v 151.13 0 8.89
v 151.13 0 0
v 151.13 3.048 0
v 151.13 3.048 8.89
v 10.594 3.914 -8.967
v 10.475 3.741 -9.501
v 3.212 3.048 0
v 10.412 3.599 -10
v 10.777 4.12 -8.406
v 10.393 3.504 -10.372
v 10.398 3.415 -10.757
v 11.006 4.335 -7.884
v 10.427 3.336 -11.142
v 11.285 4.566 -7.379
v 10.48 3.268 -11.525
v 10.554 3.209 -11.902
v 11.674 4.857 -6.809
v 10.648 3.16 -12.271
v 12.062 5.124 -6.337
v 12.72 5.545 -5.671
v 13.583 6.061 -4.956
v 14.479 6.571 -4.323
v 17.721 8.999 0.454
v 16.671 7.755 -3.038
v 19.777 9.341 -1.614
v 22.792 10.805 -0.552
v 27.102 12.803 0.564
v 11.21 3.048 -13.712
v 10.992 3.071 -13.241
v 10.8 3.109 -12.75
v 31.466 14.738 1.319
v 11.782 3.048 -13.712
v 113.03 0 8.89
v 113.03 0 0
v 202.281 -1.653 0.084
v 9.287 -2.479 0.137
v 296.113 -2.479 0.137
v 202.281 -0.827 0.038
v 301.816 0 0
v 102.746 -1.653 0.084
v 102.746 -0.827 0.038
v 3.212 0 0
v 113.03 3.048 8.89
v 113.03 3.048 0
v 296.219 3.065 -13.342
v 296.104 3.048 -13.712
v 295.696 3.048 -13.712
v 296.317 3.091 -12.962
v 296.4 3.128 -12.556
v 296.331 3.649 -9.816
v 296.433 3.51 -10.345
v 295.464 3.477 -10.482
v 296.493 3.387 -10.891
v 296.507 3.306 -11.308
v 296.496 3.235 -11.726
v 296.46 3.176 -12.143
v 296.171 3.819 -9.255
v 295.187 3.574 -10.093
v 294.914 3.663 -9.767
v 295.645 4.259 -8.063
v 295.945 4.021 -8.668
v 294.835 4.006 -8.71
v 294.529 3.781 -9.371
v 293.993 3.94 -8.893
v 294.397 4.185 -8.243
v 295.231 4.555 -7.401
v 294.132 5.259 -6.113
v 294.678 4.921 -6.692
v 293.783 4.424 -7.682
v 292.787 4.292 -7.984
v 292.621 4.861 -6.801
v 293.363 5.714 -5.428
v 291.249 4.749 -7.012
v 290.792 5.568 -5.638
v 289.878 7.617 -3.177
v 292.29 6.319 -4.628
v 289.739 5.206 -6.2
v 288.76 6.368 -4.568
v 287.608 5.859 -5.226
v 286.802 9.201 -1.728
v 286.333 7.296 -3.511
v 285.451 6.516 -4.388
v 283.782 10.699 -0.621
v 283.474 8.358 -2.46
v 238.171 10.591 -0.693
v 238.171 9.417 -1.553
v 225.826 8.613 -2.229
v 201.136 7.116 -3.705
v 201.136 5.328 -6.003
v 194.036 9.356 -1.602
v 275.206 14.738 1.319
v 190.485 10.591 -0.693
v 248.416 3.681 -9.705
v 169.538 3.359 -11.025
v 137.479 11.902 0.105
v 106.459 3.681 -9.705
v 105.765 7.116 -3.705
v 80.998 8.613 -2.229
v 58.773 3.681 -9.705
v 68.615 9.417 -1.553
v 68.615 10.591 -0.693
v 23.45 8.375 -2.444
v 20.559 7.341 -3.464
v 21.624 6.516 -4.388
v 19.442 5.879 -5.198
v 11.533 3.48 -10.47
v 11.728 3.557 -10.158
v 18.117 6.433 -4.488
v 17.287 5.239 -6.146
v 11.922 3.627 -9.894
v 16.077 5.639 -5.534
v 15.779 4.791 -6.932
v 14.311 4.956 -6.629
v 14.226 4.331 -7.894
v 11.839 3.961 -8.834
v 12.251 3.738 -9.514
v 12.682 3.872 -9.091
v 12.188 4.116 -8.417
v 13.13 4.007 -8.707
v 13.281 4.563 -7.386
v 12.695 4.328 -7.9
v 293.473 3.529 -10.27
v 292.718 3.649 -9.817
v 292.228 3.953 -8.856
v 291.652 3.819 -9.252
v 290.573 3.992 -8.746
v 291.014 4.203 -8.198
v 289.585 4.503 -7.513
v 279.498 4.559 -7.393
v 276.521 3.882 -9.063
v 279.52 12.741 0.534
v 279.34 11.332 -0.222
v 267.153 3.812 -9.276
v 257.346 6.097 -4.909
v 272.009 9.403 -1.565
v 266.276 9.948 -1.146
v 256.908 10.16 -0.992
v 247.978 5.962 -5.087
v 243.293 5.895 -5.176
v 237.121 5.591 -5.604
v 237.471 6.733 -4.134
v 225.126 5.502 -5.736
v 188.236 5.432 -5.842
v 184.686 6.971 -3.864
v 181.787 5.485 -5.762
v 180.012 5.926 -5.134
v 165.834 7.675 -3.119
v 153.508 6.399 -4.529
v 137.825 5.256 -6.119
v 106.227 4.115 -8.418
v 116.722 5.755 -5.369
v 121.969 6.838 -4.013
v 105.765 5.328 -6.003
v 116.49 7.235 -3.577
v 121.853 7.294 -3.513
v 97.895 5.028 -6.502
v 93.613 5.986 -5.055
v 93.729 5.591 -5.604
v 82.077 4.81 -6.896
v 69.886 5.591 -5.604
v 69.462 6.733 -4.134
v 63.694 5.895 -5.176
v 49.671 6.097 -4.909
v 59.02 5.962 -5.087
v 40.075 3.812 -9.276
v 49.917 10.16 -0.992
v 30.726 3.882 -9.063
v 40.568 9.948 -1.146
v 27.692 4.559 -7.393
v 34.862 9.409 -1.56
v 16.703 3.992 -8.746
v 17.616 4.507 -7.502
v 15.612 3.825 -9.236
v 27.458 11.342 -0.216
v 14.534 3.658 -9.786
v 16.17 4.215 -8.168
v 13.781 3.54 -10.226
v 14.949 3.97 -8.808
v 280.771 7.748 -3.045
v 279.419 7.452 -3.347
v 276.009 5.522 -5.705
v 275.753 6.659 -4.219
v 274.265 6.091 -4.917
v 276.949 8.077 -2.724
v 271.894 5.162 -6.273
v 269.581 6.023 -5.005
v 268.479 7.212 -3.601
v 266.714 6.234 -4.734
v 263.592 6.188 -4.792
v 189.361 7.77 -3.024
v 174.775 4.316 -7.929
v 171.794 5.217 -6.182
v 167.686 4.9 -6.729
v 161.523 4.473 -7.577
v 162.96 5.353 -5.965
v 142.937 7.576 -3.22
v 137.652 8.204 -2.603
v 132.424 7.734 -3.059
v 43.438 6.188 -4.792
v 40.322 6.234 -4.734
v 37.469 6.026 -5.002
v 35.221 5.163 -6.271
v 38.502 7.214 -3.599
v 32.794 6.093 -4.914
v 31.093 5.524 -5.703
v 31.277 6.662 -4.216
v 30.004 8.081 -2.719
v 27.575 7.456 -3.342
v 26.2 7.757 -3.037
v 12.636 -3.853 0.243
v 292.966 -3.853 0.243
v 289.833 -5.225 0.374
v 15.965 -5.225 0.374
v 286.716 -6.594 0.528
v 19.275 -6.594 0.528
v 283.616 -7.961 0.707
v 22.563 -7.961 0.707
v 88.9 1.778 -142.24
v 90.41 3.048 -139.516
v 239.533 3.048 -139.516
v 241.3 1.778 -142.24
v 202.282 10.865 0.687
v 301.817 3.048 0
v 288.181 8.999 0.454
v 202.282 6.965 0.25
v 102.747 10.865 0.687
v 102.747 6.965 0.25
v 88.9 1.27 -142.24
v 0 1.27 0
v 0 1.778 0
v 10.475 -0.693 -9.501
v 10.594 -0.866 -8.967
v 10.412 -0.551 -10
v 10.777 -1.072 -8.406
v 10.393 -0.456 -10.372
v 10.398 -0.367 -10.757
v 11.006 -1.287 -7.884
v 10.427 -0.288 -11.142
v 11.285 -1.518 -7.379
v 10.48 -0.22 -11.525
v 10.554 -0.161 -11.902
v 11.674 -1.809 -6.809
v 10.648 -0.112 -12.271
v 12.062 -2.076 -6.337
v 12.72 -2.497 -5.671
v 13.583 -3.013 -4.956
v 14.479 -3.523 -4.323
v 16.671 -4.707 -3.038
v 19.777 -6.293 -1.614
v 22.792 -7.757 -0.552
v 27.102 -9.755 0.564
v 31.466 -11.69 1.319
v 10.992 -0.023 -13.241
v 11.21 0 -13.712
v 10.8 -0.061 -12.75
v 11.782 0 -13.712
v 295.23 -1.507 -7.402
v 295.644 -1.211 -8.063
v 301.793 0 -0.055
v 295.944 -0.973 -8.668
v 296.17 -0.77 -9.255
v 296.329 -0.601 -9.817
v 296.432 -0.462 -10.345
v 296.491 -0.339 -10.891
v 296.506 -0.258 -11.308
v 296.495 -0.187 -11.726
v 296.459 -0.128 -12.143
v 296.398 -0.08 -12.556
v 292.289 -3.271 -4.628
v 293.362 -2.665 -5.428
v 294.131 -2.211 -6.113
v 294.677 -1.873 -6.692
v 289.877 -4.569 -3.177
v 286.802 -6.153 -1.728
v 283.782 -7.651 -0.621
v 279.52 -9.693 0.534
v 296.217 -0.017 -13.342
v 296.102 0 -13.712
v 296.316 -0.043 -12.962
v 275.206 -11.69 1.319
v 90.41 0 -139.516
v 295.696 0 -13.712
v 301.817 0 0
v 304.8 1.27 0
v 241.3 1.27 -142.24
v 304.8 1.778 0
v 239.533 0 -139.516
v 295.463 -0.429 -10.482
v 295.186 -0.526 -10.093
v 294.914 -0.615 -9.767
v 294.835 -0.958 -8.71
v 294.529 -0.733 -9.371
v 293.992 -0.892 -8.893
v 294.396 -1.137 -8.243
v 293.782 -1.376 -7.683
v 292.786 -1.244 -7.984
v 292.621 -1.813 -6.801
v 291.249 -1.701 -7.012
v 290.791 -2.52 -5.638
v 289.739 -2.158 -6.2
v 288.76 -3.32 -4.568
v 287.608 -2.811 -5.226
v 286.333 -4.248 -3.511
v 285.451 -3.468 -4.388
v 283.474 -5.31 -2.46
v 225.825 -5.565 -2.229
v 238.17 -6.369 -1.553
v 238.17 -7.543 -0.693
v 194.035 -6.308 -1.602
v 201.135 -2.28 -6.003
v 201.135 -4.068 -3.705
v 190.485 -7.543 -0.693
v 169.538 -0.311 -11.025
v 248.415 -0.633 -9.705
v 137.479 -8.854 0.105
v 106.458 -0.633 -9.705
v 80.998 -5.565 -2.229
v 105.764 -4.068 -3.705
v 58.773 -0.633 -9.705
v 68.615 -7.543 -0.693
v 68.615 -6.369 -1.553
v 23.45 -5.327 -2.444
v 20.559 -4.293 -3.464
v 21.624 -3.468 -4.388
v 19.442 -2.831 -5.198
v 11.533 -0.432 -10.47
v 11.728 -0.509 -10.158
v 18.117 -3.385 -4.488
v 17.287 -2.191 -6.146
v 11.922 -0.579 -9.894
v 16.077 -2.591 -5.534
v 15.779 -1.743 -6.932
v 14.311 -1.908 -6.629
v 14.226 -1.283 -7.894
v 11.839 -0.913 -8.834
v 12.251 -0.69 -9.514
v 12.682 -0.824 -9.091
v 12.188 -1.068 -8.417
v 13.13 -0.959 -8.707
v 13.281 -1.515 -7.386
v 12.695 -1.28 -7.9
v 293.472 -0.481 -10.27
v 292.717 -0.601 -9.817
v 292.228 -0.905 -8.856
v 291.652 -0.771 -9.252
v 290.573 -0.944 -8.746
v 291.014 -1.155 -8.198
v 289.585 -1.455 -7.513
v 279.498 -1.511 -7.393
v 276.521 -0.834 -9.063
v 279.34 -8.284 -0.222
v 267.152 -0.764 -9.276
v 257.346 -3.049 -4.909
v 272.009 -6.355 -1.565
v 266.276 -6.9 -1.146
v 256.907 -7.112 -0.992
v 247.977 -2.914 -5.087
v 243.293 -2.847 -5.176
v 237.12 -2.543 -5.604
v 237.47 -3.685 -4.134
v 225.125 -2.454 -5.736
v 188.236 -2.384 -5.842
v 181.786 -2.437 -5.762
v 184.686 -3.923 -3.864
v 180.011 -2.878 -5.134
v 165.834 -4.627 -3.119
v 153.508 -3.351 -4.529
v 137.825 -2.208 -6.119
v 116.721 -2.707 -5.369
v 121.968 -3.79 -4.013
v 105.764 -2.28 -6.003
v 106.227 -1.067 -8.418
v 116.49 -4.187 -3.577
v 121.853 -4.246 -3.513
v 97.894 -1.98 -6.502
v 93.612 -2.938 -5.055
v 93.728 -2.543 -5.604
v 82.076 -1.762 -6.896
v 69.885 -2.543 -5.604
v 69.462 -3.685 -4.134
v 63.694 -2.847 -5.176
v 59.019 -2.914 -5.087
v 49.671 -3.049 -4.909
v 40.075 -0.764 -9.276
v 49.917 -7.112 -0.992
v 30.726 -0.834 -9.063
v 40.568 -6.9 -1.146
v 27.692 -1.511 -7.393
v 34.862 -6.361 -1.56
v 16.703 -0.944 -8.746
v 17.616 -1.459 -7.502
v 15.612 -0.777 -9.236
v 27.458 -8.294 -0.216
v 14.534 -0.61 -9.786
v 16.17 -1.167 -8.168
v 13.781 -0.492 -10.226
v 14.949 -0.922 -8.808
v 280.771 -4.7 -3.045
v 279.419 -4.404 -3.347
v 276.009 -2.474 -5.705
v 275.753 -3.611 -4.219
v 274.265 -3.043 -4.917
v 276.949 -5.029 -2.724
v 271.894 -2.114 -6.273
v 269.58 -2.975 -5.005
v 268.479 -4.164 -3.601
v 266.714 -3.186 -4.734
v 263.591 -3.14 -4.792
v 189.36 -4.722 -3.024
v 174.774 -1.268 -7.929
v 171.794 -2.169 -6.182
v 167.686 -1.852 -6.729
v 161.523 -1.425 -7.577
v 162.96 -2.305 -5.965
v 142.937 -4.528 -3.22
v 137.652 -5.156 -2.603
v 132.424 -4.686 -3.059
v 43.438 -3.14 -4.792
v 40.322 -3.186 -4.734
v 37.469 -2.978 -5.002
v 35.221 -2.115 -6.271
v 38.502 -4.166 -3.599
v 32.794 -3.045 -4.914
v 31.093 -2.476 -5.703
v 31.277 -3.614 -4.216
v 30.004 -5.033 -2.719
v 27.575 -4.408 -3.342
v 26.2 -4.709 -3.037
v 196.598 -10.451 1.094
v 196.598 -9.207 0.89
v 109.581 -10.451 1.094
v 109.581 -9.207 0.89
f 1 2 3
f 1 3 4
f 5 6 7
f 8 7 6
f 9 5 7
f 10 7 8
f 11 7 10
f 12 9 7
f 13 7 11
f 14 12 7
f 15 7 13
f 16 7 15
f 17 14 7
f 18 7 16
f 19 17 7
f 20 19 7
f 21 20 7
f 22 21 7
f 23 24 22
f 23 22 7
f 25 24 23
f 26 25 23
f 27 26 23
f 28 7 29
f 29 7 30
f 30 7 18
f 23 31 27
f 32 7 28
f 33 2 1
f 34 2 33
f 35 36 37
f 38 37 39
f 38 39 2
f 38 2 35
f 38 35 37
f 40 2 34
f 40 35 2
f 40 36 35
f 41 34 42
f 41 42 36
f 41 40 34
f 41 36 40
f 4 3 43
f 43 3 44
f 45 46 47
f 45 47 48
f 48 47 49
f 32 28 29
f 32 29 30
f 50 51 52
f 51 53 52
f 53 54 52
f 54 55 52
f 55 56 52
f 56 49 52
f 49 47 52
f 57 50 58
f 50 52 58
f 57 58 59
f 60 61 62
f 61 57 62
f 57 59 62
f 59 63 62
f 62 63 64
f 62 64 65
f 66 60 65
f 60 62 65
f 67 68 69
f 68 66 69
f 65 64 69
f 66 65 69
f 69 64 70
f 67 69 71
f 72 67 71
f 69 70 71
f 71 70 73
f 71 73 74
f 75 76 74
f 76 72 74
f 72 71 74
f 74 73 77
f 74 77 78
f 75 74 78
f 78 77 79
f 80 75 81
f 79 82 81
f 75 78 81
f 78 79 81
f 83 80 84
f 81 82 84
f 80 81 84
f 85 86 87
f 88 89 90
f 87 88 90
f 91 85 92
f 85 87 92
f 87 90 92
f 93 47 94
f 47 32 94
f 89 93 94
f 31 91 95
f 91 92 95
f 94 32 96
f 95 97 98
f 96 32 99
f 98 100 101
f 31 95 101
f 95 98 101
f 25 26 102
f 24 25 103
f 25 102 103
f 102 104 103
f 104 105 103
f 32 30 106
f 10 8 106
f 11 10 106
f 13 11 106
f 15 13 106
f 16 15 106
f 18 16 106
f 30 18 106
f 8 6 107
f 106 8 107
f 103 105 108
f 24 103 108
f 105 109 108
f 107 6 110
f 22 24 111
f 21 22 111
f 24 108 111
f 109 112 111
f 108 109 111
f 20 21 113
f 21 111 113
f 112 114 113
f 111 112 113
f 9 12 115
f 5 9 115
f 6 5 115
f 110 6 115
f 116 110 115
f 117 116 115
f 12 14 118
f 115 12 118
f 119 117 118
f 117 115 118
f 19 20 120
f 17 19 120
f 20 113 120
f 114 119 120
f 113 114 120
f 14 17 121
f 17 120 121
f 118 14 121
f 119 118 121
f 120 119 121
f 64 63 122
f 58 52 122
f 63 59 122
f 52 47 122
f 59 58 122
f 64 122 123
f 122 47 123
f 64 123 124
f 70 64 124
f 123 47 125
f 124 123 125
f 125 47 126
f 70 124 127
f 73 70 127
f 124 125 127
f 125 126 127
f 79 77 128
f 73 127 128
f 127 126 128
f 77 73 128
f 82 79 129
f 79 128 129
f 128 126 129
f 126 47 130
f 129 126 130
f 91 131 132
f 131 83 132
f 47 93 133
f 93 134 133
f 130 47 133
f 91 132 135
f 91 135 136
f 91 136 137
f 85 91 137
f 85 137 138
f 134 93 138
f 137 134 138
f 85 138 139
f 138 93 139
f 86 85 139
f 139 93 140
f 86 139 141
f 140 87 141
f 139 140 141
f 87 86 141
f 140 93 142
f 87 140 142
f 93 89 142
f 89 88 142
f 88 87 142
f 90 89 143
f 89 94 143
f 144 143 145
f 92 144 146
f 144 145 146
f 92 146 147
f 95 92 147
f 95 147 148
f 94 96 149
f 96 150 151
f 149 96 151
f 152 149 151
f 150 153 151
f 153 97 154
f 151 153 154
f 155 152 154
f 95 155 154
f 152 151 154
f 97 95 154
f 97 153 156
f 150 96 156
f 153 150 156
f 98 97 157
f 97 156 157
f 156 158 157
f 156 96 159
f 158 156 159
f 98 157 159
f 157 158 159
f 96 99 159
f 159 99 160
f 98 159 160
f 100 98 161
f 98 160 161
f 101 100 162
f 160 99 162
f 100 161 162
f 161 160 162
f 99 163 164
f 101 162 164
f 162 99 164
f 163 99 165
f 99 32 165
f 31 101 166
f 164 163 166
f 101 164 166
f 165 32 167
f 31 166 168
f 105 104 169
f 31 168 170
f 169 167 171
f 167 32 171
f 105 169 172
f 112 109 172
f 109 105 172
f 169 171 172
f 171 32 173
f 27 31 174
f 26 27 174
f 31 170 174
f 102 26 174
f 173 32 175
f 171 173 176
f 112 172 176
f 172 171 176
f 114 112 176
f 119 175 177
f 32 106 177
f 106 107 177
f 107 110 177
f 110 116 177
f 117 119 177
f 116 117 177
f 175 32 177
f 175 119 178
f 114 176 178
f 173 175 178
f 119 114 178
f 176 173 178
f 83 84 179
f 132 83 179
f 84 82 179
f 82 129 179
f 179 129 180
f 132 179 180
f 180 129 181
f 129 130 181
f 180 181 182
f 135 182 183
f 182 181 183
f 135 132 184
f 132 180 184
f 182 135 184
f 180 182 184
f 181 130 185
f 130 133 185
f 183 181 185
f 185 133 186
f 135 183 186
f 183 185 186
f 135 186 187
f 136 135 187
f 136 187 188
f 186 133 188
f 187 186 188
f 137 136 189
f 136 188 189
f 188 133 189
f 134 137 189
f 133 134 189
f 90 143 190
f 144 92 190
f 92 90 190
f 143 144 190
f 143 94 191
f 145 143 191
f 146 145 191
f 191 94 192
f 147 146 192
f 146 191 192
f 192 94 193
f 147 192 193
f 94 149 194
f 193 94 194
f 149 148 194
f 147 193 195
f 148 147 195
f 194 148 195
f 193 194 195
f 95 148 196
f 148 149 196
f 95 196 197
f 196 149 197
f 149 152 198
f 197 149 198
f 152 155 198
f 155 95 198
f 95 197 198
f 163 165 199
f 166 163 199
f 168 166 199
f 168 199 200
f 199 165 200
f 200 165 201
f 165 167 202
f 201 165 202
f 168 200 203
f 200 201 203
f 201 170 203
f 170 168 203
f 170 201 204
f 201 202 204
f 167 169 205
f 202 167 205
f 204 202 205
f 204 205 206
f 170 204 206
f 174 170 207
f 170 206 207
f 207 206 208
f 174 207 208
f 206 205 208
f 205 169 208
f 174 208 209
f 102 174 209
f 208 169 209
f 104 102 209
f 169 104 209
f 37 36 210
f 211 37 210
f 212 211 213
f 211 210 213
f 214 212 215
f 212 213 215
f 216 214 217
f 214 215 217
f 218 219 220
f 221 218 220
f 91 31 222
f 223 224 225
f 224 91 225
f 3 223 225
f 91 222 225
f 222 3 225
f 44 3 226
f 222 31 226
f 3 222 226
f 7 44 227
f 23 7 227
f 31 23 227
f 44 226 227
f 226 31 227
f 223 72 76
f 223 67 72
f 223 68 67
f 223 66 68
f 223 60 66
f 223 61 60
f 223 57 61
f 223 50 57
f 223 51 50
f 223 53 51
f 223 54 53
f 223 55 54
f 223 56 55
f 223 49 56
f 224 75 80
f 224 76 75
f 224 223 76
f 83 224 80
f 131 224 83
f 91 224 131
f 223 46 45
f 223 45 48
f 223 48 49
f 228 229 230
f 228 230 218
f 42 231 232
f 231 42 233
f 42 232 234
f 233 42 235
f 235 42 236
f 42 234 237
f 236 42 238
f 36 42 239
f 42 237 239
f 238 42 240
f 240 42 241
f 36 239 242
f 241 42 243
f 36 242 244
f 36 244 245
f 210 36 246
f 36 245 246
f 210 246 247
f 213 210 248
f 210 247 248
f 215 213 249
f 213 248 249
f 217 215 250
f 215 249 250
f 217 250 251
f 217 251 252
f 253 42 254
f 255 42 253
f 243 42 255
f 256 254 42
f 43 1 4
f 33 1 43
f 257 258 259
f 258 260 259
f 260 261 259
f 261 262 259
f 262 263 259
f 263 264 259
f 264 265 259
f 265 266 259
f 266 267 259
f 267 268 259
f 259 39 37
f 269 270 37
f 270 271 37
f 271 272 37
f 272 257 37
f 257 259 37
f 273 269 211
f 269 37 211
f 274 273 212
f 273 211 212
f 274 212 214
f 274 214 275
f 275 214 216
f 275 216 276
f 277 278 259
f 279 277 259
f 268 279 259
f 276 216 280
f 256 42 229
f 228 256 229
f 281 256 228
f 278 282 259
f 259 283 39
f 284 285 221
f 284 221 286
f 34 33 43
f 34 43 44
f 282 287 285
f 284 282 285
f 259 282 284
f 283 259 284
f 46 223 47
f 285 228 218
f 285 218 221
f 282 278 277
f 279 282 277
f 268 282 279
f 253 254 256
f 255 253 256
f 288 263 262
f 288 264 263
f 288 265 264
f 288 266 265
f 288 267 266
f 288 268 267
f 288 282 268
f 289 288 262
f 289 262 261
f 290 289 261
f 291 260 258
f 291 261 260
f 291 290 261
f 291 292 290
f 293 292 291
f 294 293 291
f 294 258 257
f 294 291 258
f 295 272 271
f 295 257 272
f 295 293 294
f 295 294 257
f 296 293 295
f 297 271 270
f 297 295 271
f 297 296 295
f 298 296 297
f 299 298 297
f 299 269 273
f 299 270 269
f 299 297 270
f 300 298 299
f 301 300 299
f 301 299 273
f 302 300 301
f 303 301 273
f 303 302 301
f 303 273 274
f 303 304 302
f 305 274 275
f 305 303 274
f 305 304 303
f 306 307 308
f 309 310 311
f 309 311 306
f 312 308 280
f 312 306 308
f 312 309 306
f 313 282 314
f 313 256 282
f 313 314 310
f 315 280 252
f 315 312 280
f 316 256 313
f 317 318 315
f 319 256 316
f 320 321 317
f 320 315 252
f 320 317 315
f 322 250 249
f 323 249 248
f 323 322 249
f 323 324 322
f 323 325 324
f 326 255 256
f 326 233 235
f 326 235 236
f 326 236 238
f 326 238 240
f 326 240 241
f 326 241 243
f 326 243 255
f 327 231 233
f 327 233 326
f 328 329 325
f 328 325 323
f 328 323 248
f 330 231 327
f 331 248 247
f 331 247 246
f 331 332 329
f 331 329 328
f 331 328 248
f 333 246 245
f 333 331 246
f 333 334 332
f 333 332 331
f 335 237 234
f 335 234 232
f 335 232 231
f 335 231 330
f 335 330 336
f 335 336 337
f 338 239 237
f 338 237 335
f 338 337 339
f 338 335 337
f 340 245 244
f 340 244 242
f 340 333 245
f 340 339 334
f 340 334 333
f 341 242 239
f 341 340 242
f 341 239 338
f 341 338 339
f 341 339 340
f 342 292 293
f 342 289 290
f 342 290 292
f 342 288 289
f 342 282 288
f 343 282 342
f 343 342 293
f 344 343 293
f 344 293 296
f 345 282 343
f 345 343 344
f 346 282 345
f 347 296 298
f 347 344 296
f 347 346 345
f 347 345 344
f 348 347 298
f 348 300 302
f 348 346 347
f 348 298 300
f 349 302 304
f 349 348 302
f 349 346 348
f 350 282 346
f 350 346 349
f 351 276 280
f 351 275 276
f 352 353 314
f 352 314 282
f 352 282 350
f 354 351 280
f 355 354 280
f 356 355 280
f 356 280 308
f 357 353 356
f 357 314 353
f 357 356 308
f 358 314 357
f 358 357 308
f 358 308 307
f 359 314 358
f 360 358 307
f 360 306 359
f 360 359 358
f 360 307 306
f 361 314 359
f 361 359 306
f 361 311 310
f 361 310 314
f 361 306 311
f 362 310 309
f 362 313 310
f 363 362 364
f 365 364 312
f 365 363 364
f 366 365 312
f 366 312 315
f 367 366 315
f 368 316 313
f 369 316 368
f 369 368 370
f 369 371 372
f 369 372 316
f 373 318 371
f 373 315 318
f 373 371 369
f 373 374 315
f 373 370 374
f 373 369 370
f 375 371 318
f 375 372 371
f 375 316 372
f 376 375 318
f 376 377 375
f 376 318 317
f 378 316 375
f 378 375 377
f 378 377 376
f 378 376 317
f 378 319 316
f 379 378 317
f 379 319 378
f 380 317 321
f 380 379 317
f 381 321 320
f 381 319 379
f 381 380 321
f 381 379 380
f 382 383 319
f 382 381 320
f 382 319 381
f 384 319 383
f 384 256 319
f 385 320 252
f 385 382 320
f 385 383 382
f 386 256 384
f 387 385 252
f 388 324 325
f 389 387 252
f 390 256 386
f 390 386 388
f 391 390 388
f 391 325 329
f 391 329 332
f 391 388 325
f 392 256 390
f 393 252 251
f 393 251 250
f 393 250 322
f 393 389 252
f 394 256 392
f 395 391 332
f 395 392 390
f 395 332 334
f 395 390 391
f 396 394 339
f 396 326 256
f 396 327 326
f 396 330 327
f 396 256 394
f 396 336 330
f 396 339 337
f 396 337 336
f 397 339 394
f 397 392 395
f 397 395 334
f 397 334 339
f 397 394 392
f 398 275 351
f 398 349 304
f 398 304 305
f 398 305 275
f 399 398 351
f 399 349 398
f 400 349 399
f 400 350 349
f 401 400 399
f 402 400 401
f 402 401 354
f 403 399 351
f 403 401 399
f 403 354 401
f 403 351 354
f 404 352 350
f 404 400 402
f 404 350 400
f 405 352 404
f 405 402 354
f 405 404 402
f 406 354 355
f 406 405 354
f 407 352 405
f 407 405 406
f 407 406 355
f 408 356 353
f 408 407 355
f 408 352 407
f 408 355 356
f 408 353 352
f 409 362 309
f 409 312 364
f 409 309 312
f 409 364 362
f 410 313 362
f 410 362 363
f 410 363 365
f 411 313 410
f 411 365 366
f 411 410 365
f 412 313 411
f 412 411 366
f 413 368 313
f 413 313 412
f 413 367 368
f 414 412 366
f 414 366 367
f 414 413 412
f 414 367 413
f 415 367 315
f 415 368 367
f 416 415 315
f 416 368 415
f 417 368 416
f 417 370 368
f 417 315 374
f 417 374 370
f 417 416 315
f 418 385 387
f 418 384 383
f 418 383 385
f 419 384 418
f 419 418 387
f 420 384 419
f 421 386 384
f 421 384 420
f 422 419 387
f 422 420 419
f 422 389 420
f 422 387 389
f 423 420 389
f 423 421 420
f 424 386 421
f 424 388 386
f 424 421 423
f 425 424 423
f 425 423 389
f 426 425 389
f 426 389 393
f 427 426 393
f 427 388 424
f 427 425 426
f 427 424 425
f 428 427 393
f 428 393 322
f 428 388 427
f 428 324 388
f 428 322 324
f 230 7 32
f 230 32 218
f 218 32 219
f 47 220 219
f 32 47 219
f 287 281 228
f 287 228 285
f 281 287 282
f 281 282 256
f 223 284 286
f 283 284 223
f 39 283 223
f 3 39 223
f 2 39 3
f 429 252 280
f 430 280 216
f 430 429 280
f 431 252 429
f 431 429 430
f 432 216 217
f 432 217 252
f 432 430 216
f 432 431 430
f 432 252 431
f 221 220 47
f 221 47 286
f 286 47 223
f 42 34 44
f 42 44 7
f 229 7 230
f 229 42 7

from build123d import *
from OCP.BRepFilletAPI import BRepFilletAPI_MakeChamfer

# Parameters (mm, degrees)
BOSS_EXTRUDE1_DEPTH      = 3.048
CHAMFER1_SIZE            = 1.27
CHAMFER1_SIZE2           = 2.723523789
BOSS_EXTRUDE2_DEPTH      = 304.8
LEADING_SIDE_DEPTH       = 337.678601078
LEADING_SIDE_DEPTH_BACK  = 337.678601078
TRAILING_SIDE_DEPTH      = 254
TRAILING_SIDE_DEPTH_BACK = 27.94


# Read off the part's stored shape, not the designer's step: Boss-Extrude2
with BuildPart() as part:
    # Sketch1 → Boss-Extrude1 (new body)
    with BuildSketch(Plane(origin=(0, 0, 0), x_dir=(1, 0, 0), z_dir=(0, 1, 0))):
        Polygon((0, 0), (88.9, 142.24), (241.3, 142.24), (304.8, 0), (151.13, 0), (151.13, -8.89), (113.03, -8.89), (113.03, 0), align=None)
    extrude(amount=BOSS_EXTRUDE1_DEPTH)

    # Chamfer1: one chamfer whose edges measure the first distance from different faces: ONE call of the kernel's chamfer builder (chamfer() names one face for all edges)
    chamfer1_edges_1 = [part.edges().sort_by_distance(p)[0] for p in [
        (273.05, 3.048, -71.12),
        (273.05, 0, -71.12),
    ]]
    chamfer1_side_1 = [part.faces().sort_by_distance(p)[0] for p in [
        (273.05, 1.524, -71.12),
    ]]
    chamfer1_edges_2 = [part.edges().sort_by_distance(p)[0] for p in [
        (165.1, 3.048, -142.24),
        (165.1, 0, -142.24),
    ]]
    chamfer1_side_2 = [part.faces().sort_by_distance(p)[0] for p in [
        (165.1, 1.524, -142.24),
    ]]
    chamfer1_edges_3 = [part.edges().sort_by_distance(p)[0] for p in [
        (44.45, 3.048, -71.12),
        (44.45, 0, -71.12),
    ]]
    chamfer1_side_3 = [part.faces().sort_by_distance(p)[0] for p in [
        (44.45, 1.524, -71.12),
    ]]
    chamfer1 = BRepFilletAPI_MakeChamfer(part.part.solid().wrapped)
    for e in chamfer1_edges_1:
        chamfer1.Add(CHAMFER1_SIZE, CHAMFER1_SIZE2, e.wrapped, chamfer1_side_1[0].wrapped)  # the first distance lies on this face
    for e in chamfer1_edges_2:
        chamfer1.Add(CHAMFER1_SIZE, CHAMFER1_SIZE2, e.wrapped, chamfer1_side_2[0].wrapped)  # the first distance lies on this face
    for e in chamfer1_edges_3:
        chamfer1.Add(CHAMFER1_SIZE, CHAMFER1_SIZE2, e.wrapped, chamfer1_side_3[0].wrapped)  # the first distance lies on this face
    add(Compound.cast(chamfer1.Shape()), mode=Mode.REPLACE)

    # Boss-Extrude2 outline → Boss-Extrude2 (add)
    with BuildSketch(Plane(origin=(0, 0, 0), x_dir=(0, 0, -1), z_dir=(1, 0, 0))):
        with BuildLine():
            add(Edge.make_bspline(
                [(-1.319449565, -11.69047888), (-1.083912463, -10.452594474), (-0.880163154, -9.208724492), (-0.706755386, -7.960561287)],
                knots=[0, 0, 0, 0, 0.321044666, 0.321044666, 0.321044666, 0.321044666], degree=3))
            add(Edge.make_bspline(
                [(13.71197658, 0), (11.02178845, -0.093200554), (7.303438621, -1.100845461), (2.014457887, -5.338152095), (-0.385242208, -8.714114828), (-1.319449565, -11.69047888)],
                knots=[0, 0, 0, 0, 0.400857747, 0.544791842, 1, 1, 1, 1], degree=3))
            Line((13.71197658, 0), (0, 0))
            add(Edge.make_bspline(
                [(-0.137299539, -2.479180327), (-0.079487033, -1.653414855), (-0.033857167, -0.826861513), (0, 0)],
                knots=[0.789109162, 0.789109162, 0.789109162, 0.789109162, 1, 1, 1, 1], degree=3))
            ThreePointArc((-0.137299539, -2.479180327), (-0.3738253, -5.224878487), (-0.706755386, -7.960561287))
        make_face()
        with BuildLine():
            Line((0, 3.048), (13.71197658, 3.048))
            add(Edge.make_bspline(
                [(13.71197658, 3.048), (11.02178845, 3.141200554), (7.303438621, 4.148845461), (2.014457887, 8.386152095), (-0.385242208, 11.762114828), (-1.319449565, 14.73847888)],
                knots=[0, 0, 0, 0, 0.400857747, 0.544791842, 1, 1, 1, 1], degree=3))
            add(Edge.make_bspline(
                [(-1.319449565, 14.73847888), (-0.58579121, 10.882677695), (-0.160543563, 6.9688034), (0, 3.048)],
                knots=[0, 0, 0, 0, 1, 1, 1, 1], degree=3))
        make_face()
    extrude(amount=BOSS_EXTRUDE2_DEPTH)

    # Sketch4 → Leading Side (cut, two sides: drawn at the far end of the back side and taken through both)
    with BuildSketch(Plane(origin=(0, 0, 0), x_dir=(0, -1, 0), z_dir=(-0.5038644349256837, 0, 0.8637827453804698)).offset(-LEADING_SIDE_DEPTH_BACK)):
        Polygon((0, -7.461077899), (0, 2.774218822), (11.69047888, 27.844531684), (11.69047888, -6.284577832), align=None)
        Polygon((-14.73847888, 27.844531684), (-14.73847888, -6.284577832), (-3.048, -7.461077899), (-3.048, 2.774218822), align=None)
    extrude(amount=LEADING_SIDE_DEPTH + LEADING_SIDE_DEPTH_BACK, mode=Mode.SUBTRACT)

    # Sketch6 → Trailing Side (cut, two sides: drawn at the far end of the back side and taken through both)
    with BuildSketch(Plane(origin=(45.089267536, 0, 108.213523637), x_dir=(0, -1, 0), z_dir=(-0.384617560400187, 0, -0.9230760164969126)).offset(-TRAILING_SIDE_DEPTH_BACK)):
        Polygon((0, -286.627436809), (0, -278.59888787), (11.69047888, -253.528575007), (11.69047888, -287.965550571), align=None)
        Polygon((-14.73847888, -253.528575007), (-14.73847888, -287.965550571), (-3.048, -286.627436809), (-3.048, -278.600404574), align=None)
    extrude(amount=TRAILING_SIDE_DEPTH + TRAILING_SIDE_DEPTH_BACK, mode=Mode.SUBTRACT)


solid = part.part
